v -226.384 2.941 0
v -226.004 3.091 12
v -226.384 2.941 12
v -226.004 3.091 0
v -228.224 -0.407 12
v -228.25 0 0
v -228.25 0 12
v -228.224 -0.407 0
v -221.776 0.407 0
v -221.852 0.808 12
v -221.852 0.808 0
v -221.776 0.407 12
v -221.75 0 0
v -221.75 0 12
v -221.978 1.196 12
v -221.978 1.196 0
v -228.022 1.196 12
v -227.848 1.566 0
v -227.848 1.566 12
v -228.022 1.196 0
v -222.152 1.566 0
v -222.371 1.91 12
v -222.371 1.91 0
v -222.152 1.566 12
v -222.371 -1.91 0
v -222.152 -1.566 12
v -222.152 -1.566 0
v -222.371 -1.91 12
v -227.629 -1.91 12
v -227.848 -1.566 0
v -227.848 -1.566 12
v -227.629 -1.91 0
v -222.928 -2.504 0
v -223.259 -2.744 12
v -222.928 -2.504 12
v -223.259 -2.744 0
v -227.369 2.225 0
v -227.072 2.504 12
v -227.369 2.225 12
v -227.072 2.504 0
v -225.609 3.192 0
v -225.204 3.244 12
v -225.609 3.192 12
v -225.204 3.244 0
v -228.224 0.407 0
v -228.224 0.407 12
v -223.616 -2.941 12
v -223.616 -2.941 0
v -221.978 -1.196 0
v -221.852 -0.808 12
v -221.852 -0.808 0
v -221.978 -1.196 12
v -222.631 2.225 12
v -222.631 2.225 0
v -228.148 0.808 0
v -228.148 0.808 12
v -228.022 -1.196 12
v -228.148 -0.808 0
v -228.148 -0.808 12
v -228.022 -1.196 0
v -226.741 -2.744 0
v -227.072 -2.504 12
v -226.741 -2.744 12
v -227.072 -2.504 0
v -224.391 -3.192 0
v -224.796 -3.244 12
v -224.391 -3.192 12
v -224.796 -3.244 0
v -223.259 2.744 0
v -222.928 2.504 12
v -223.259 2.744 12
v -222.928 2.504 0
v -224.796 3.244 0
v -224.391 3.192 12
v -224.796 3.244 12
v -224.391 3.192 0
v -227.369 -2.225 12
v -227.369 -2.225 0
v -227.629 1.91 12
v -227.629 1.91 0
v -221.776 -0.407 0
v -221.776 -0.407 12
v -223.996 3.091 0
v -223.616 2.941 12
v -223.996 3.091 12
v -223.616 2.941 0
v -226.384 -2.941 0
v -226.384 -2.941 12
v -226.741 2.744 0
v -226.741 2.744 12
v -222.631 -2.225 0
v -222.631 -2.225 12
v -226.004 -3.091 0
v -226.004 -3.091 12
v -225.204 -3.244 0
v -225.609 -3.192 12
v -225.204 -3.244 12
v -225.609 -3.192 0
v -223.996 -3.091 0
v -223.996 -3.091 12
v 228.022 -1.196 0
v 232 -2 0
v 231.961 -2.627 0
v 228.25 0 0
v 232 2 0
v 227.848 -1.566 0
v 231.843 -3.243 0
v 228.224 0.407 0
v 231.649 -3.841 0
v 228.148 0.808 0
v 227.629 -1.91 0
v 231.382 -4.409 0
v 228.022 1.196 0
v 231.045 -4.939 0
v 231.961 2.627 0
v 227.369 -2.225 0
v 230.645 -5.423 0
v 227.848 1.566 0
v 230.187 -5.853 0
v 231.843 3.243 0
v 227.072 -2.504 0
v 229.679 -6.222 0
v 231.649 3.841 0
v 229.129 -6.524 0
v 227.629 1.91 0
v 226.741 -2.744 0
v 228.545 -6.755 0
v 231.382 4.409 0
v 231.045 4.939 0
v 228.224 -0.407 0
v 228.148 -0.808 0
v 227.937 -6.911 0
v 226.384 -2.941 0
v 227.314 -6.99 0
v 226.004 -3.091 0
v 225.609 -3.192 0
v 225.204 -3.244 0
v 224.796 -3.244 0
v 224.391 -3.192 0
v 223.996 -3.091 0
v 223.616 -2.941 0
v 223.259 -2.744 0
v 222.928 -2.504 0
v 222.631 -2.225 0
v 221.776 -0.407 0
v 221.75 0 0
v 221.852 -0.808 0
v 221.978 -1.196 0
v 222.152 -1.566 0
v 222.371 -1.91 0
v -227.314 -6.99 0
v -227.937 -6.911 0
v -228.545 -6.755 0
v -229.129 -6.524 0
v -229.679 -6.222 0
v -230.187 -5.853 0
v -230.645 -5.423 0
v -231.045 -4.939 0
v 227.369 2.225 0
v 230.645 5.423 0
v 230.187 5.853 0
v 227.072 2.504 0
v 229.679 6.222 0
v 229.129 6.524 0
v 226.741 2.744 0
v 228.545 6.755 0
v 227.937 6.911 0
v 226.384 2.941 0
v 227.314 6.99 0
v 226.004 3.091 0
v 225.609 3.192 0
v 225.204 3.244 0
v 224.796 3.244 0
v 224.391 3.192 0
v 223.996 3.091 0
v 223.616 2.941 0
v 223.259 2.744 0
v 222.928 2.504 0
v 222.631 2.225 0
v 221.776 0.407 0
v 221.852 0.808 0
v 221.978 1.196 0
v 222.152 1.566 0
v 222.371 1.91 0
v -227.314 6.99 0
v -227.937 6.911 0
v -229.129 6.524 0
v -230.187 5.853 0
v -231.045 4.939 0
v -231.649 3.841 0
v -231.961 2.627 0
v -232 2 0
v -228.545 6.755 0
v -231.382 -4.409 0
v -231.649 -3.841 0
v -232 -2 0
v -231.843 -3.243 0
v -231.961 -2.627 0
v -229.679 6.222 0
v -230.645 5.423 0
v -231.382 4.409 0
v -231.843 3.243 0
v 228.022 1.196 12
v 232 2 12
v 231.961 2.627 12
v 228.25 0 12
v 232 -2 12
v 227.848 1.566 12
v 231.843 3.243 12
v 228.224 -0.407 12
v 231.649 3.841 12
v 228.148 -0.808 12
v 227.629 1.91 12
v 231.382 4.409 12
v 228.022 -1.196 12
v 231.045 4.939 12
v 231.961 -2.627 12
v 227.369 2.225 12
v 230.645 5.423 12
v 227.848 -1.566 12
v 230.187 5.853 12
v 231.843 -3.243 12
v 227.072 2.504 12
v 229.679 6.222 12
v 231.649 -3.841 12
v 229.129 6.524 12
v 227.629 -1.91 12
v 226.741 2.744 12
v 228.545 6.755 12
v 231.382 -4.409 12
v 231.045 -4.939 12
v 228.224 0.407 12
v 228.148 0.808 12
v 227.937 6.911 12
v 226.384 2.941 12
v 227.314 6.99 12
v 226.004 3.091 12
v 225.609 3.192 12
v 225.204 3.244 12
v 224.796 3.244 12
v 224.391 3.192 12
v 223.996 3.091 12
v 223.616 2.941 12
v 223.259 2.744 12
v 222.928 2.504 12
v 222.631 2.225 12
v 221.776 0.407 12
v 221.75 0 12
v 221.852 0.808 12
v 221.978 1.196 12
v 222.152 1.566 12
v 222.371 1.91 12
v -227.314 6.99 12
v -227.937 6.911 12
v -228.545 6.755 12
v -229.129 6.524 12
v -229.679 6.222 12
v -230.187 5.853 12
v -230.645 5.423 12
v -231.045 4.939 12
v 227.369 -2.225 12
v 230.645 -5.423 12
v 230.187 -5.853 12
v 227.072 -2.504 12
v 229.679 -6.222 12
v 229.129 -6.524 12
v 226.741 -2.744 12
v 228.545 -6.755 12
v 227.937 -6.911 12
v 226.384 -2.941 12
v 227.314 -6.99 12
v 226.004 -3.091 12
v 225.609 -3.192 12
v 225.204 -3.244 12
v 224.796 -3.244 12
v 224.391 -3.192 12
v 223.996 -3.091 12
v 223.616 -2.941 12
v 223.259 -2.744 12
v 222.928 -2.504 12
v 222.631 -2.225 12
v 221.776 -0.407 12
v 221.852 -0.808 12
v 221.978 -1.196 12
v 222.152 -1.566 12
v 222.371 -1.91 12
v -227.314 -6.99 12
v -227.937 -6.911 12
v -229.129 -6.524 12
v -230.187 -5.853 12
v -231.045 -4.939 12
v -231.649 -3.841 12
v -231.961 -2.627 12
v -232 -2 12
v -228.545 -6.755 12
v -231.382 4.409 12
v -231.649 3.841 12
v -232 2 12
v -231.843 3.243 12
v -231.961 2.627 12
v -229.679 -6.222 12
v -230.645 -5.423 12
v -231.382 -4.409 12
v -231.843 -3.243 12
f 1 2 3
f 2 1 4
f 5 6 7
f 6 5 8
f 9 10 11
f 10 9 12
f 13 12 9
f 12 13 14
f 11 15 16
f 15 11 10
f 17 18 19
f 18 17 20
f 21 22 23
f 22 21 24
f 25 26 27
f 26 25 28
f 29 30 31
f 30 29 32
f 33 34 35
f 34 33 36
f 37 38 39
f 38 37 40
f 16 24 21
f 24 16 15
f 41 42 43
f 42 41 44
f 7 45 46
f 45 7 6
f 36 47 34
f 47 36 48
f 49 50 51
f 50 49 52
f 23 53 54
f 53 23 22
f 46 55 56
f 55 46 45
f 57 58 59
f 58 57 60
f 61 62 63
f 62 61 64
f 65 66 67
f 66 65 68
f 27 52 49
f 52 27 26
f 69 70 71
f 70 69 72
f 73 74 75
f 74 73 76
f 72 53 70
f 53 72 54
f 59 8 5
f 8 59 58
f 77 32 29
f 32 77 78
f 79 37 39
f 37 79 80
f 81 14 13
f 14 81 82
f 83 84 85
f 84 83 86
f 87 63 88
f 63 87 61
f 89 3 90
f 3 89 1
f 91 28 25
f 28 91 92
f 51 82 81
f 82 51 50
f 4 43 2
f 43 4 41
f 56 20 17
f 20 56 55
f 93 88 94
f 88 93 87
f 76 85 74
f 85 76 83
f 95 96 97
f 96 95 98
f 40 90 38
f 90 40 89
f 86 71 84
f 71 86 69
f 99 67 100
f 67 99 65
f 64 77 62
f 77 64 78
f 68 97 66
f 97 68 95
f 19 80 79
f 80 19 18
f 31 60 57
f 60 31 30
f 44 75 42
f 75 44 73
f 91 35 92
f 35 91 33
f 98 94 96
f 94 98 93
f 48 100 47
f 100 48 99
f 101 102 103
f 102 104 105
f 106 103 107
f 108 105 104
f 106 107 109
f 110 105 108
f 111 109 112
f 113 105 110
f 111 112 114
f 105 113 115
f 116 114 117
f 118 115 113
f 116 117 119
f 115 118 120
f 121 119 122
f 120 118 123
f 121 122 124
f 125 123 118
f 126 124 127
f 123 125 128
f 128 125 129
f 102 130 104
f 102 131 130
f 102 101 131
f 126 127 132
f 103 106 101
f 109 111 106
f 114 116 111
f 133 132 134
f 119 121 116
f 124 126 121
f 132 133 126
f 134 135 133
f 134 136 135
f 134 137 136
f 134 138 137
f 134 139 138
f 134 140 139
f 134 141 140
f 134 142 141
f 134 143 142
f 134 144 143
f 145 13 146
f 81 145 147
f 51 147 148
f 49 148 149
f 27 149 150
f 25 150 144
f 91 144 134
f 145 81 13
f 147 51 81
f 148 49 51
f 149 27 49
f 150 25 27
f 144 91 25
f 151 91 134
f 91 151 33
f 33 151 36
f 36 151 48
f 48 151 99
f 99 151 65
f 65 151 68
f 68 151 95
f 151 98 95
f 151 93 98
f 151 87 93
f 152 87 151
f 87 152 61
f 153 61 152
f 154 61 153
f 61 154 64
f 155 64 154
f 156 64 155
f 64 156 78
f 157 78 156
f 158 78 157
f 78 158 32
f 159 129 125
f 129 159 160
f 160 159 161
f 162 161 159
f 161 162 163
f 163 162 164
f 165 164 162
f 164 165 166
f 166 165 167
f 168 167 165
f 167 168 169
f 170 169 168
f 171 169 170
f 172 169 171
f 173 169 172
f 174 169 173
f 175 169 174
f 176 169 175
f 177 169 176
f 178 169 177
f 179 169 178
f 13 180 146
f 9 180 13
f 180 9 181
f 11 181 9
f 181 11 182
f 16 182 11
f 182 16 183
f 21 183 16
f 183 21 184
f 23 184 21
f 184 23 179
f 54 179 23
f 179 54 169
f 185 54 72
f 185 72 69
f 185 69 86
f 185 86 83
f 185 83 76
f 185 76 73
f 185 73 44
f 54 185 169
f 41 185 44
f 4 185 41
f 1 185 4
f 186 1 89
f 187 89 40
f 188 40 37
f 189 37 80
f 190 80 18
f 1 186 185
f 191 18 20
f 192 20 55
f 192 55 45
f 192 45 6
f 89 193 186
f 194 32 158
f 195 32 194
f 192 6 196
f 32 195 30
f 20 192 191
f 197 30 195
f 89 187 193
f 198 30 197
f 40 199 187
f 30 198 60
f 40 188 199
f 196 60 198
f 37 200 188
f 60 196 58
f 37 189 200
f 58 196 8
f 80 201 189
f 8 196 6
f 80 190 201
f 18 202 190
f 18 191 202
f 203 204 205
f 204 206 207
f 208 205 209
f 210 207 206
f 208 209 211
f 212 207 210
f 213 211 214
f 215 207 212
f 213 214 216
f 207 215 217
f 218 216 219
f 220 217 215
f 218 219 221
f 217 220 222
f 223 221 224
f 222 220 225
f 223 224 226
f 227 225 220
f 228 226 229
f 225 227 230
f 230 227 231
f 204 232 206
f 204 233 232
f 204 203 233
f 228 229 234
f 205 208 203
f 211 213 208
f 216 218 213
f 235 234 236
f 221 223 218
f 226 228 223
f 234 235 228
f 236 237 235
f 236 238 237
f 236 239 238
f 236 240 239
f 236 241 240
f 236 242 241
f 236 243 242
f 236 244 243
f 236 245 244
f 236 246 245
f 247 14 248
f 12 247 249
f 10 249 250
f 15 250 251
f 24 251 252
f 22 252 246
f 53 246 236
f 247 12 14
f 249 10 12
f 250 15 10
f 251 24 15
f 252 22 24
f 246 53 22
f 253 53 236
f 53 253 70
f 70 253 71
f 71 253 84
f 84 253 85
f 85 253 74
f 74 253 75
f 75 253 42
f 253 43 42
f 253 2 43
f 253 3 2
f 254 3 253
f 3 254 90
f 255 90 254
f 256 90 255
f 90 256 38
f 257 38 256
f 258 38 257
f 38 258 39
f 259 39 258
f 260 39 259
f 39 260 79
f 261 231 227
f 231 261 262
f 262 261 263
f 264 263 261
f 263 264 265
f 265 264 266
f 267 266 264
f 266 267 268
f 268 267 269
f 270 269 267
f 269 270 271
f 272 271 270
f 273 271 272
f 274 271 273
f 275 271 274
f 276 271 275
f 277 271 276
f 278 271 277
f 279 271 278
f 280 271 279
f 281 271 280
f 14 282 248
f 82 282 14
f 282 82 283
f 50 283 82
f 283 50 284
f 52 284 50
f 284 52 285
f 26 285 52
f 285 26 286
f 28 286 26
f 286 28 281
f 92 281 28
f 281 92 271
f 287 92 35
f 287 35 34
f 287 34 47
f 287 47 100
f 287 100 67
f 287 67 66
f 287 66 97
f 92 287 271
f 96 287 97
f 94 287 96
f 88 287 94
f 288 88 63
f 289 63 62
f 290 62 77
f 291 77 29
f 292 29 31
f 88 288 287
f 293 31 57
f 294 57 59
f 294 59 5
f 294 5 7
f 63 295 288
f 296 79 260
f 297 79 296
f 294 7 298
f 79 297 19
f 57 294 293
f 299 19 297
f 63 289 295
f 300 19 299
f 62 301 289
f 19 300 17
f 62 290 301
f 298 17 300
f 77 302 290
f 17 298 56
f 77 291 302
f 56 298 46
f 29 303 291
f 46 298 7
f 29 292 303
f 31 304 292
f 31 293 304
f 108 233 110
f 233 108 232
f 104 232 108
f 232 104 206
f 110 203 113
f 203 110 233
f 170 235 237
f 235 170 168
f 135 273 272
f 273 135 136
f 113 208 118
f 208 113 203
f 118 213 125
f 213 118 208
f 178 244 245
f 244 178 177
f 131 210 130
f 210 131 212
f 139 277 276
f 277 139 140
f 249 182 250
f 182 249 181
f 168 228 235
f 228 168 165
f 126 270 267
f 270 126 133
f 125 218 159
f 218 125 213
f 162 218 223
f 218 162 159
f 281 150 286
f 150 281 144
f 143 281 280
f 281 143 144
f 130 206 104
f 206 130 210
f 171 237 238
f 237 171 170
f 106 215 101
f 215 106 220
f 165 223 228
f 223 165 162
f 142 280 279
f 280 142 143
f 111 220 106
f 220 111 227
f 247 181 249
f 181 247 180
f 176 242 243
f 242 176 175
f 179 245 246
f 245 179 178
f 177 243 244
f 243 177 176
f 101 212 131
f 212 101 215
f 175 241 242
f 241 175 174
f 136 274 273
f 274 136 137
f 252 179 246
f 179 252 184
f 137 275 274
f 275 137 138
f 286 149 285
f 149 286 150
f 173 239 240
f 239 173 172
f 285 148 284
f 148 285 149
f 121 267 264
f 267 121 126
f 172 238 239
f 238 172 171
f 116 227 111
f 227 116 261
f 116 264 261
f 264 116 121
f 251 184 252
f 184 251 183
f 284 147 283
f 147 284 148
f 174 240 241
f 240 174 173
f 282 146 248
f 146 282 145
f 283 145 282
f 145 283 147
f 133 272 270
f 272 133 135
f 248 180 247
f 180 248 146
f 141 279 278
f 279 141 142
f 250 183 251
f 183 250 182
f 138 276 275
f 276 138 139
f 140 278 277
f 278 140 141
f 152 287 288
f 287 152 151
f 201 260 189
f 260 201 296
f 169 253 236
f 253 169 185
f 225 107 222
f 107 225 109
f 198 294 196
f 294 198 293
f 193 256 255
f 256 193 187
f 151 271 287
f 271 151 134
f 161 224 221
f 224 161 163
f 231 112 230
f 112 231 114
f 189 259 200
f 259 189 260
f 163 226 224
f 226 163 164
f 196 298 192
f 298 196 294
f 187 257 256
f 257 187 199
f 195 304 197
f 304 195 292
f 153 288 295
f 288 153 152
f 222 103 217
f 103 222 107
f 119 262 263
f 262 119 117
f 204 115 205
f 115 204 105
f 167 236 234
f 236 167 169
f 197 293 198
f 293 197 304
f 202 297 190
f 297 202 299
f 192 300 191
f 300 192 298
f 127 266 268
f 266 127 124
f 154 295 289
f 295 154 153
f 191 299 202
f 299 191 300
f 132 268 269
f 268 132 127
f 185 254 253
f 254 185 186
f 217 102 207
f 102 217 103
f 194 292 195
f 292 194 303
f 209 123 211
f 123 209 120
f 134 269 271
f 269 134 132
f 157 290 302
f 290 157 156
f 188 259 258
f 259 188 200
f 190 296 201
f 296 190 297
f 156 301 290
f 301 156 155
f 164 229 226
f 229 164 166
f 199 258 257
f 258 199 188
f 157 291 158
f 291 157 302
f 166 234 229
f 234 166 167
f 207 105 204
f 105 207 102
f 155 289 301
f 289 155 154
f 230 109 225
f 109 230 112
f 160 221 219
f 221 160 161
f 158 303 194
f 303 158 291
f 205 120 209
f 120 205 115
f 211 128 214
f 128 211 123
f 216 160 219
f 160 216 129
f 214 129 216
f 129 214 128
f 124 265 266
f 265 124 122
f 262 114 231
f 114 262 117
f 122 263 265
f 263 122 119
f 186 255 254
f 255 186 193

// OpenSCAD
$fn = 50;


difference() {
	union() {
		hull() {
			translate(v = [-227.0000000000, 2.0000000000, 0]) {
				cylinder(h = 12, r = 5);
			}
			translate(v = [227.0000000000, 2.0000000000, 0]) {
				cylinder(h = 12, r = 5);
			}
			translate(v = [-227.0000000000, -2.0000000000, 0]) {
				cylinder(h = 12, r = 5);
			}
			translate(v = [227.0000000000, -2.0000000000, 0]) {
				cylinder(h = 12, r = 5);
			}
		}
	}
	union() {
		translate(v = [-225.0000000000, 0.0000000000, 0]) {
			cylinder(h = 12, r = 3.2500000000);
		}
		translate(v = [225.0000000000, 0.0000000000, 0]) {
			cylinder(h = 12, r = 3.2500000000);
		}
		translate(v = [-225.0000000000, 0.0000000000, 0]) {
			cylinder(h = 12, r = 1.8000000000);
		}
		translate(v = [225.0000000000, 0.0000000000, 0]) {
			cylinder(h = 12, r = 1.8000000000);
		}
		translate(v = [-225.0000000000, 0.0000000000, 0]) {
			cylinder(h = 12, r = 1.8000000000);
		}
		translate(v = [225.0000000000, 0.0000000000, 0]) {
			cylinder(h = 12, r = 1.8000000000);
		}
		translate(v = [-225.0000000000, 0.0000000000, 0]) {
			cylinder(h = 12, r = 1.8000000000);
		}
		translate(v = [225.0000000000, 0.0000000000, 0]) {
			cylinder(h = 12, r = 1.8000000000);
		}
	}
}
